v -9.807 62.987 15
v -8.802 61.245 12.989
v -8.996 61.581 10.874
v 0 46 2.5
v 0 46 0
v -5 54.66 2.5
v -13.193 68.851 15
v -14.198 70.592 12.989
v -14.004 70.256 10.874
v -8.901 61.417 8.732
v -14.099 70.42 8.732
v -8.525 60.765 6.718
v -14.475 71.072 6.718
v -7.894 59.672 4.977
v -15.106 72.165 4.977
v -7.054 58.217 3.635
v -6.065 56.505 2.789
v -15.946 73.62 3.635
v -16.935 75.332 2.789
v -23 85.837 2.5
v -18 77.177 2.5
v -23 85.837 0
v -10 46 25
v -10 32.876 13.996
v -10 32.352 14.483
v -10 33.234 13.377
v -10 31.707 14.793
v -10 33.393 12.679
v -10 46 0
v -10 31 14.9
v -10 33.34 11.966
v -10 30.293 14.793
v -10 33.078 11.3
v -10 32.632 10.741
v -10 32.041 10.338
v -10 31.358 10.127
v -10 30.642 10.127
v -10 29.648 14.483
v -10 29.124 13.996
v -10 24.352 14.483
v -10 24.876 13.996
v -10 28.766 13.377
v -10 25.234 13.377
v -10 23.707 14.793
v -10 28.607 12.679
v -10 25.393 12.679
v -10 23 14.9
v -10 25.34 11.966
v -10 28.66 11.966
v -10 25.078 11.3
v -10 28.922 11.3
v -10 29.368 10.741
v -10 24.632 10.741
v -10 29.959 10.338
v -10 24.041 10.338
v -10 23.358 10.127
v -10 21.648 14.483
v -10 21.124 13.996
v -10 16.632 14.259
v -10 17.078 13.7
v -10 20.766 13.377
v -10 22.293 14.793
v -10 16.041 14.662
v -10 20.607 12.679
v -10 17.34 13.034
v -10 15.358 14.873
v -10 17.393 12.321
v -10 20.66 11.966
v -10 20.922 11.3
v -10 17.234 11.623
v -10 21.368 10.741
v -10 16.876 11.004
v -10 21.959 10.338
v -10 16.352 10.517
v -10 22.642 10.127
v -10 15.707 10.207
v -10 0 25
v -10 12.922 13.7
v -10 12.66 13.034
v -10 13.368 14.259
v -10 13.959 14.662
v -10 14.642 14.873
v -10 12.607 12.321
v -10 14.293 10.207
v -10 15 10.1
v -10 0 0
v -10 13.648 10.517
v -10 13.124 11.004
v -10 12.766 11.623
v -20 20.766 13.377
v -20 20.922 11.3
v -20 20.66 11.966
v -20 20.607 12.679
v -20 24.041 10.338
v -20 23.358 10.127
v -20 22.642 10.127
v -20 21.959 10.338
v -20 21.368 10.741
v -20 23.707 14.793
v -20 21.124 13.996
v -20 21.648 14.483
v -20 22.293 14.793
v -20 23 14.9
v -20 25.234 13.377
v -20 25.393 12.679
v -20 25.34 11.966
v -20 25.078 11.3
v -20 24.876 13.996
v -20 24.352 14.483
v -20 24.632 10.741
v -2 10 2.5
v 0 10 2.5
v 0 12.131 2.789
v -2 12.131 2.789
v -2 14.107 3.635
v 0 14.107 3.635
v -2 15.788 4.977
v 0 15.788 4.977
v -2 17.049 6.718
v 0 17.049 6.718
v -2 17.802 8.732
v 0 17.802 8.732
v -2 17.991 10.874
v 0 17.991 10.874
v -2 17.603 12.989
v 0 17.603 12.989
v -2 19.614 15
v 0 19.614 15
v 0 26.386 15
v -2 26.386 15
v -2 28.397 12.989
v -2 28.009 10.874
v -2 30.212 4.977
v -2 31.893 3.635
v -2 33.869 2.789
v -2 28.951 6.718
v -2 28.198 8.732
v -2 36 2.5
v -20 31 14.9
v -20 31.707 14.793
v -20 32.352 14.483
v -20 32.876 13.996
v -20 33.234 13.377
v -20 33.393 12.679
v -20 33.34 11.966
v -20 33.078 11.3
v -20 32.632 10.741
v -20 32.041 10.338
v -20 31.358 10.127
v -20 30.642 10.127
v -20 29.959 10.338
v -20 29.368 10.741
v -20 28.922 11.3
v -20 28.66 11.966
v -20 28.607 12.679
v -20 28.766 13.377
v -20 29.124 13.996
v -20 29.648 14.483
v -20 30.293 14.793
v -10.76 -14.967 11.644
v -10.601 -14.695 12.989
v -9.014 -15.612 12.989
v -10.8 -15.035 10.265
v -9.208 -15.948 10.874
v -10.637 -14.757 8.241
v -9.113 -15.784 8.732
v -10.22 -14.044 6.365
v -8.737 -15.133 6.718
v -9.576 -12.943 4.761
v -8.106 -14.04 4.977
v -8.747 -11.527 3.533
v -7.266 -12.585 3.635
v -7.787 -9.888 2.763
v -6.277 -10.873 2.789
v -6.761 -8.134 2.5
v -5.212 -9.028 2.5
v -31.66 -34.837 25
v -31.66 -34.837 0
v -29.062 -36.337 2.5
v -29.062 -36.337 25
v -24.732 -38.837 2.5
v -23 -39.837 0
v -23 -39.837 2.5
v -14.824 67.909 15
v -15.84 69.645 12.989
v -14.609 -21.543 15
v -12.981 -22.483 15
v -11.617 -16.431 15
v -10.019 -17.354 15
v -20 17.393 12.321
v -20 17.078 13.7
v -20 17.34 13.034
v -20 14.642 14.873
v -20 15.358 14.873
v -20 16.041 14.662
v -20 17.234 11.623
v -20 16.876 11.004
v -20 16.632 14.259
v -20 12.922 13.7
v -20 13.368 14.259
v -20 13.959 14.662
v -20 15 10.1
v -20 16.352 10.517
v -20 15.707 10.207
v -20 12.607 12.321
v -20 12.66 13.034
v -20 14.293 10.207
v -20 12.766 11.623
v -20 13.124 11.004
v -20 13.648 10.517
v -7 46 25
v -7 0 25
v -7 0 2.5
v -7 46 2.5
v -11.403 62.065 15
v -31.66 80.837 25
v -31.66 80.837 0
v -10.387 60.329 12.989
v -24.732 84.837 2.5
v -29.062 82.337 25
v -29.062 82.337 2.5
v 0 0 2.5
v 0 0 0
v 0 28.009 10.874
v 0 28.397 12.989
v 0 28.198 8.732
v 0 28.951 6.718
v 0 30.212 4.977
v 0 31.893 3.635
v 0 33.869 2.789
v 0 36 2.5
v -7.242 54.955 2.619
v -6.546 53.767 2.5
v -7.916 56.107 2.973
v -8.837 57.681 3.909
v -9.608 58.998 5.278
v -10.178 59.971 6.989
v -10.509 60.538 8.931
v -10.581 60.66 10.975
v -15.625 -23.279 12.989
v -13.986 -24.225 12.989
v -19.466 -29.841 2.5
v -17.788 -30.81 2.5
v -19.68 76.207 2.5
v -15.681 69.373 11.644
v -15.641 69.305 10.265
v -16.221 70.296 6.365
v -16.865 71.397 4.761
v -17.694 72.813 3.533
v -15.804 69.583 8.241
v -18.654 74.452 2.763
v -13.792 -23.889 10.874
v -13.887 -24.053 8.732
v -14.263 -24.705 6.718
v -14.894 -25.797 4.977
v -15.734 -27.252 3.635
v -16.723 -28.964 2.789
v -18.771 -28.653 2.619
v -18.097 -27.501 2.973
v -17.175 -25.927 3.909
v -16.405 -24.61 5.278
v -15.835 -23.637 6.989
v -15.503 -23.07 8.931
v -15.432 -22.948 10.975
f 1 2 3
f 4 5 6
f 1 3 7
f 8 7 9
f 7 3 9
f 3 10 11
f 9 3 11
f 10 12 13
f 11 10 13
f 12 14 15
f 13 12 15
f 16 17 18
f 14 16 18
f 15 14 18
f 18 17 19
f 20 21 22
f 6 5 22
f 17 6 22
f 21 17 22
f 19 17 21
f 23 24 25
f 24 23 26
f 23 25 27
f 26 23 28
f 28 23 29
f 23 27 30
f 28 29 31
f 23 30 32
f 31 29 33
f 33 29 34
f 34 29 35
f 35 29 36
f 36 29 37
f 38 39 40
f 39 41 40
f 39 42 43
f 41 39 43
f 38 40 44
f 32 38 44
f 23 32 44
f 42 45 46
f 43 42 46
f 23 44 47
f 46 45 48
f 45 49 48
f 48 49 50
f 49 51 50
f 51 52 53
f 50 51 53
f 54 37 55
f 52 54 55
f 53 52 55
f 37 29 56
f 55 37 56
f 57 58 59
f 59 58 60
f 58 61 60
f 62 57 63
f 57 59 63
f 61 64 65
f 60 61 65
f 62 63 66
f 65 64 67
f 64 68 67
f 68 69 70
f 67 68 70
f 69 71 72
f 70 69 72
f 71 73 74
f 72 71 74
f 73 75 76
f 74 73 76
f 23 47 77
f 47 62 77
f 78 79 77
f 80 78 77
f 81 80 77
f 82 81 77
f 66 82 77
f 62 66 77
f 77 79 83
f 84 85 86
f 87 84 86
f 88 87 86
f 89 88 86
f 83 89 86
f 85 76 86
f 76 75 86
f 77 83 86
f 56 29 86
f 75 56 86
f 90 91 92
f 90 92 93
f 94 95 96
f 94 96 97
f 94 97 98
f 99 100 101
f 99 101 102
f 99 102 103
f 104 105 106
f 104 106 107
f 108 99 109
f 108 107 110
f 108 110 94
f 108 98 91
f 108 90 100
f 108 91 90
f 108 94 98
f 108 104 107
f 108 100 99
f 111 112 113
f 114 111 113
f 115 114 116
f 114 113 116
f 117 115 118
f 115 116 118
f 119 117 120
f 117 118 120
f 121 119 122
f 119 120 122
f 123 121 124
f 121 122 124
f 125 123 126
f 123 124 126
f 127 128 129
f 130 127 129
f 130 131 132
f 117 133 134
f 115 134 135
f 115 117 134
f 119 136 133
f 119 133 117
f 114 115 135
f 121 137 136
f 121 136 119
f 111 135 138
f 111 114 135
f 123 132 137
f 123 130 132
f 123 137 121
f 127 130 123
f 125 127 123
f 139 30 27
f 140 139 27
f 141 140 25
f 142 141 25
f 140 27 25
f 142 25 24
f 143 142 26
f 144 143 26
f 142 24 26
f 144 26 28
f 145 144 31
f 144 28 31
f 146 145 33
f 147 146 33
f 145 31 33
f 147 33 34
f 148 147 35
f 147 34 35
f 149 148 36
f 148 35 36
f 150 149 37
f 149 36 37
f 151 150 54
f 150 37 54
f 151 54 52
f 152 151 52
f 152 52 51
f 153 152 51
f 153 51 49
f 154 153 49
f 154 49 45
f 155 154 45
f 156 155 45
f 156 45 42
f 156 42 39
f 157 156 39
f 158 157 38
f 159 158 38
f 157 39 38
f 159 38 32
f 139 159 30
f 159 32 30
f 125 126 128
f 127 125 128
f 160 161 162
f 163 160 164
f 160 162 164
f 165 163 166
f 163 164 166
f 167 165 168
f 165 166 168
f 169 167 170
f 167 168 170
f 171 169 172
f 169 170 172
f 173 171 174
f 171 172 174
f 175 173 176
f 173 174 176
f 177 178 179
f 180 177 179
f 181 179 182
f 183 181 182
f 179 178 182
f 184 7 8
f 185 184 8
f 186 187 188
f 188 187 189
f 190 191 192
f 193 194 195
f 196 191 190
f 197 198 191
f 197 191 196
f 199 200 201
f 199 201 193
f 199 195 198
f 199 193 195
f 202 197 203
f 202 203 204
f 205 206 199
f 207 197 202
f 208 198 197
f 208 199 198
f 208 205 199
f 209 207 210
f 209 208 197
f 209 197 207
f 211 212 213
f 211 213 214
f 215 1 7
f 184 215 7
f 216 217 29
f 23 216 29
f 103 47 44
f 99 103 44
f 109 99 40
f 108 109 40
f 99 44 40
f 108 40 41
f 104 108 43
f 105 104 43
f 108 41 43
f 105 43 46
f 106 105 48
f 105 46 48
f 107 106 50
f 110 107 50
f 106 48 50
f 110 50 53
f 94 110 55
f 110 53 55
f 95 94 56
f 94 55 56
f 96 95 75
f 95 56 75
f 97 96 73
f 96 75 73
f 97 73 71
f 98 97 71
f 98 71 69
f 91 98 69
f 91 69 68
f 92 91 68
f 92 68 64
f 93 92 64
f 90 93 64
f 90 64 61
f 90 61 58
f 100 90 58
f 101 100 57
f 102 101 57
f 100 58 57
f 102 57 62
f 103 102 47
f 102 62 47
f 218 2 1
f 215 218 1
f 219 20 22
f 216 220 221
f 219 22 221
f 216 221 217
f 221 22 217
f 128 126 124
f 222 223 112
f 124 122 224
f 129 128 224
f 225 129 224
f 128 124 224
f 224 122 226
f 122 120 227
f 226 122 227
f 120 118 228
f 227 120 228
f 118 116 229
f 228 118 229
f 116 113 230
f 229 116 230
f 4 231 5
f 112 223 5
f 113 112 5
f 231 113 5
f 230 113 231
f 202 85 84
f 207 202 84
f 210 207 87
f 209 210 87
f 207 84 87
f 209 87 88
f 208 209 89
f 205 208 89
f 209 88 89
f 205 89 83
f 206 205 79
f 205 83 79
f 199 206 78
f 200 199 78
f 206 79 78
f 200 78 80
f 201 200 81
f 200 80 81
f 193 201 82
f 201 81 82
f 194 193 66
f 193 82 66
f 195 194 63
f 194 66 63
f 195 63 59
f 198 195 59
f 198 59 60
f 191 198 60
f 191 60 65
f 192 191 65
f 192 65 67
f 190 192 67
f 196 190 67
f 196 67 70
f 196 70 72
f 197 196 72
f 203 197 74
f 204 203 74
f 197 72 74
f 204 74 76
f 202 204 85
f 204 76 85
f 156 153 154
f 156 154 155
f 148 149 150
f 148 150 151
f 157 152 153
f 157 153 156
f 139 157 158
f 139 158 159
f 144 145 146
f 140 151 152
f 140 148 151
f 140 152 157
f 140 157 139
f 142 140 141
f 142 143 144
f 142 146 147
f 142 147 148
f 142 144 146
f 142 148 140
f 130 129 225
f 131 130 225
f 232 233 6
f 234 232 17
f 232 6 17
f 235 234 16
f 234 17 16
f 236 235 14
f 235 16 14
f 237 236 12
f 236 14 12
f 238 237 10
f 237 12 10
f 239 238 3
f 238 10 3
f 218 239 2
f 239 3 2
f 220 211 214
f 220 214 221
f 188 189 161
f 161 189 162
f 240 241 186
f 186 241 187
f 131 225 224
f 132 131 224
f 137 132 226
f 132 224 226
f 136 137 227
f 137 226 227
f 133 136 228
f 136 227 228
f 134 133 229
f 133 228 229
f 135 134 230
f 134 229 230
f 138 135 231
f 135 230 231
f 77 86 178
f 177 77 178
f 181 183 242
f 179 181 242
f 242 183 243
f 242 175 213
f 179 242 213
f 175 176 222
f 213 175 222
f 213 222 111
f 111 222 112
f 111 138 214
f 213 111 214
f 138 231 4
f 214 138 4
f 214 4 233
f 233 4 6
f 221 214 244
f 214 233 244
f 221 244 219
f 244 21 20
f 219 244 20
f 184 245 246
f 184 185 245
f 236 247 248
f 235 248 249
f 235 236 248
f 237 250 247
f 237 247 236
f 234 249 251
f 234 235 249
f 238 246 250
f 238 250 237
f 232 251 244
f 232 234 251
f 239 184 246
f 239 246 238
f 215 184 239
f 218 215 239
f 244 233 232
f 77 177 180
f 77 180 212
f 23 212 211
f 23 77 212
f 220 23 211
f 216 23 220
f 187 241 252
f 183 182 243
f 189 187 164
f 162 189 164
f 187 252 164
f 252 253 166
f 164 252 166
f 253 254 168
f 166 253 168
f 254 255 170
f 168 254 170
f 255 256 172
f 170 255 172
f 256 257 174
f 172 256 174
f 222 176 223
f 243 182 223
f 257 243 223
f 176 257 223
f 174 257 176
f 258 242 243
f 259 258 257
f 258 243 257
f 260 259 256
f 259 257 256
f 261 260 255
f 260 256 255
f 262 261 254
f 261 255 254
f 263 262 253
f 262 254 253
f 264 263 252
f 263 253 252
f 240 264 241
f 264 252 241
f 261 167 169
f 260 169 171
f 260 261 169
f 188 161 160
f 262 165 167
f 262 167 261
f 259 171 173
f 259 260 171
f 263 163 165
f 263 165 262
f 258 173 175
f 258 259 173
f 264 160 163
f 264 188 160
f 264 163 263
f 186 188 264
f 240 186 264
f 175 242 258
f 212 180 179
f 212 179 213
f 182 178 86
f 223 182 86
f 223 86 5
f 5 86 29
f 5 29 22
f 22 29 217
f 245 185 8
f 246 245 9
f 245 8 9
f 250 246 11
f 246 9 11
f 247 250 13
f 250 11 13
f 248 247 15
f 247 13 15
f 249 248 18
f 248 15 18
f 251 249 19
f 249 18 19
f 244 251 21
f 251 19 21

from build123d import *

# Parameters (mm, degrees)
BOSS_EXTRUDE2_DEPTH = 25
CUT_EXTRUDE4_DEPTH  = 22.5
CUT_EXTRUDE5_DEPTH  = 2
CUT_EXTRUDE6_DEPTH  = 2
CUT_EXTRUDE7_DEPTH  = 2
SKETCH9_R           = 2.4
BOSS_EXTRUDE3_DEPTH = 10


with BuildPart() as part:
    # Sketch1 → Boss-Extrude2 (new body)
    with BuildSketch(Plane(origin=(0, 0, 0), x_dir=(0, 1, 0), z_dir=(0, 0, 1))):
        Polygon((0, 0), (46, 0), (85.837168574, 23), (80.837168574, 31.660254038), (46, 10), (0, 10), (-34.837168574, 31.660254038), (-39.837168574, 23), align=None)
    extrude(amount=BOSS_EXTRUDE2_DEPTH)

    # Sketch5 → Cut-Extrude4 (cut)
    with BuildSketch(Plane.XY.offset(25)):
        Polygon((-24.732050808, -38.837168574), (-29.062177826, -36.337168574), (-7, 0), (-7, 46), (-29.062177826, 82.337168574), (-24.732050808, 84.837168574), (-2, 46), (-2, 0), align=None)
    extrude(amount=-CUT_EXTRUDE4_DEPTH, mode=Mode.SUBTRACT)

    # Sketch6 → Cut-Extrude5 (cut)
    with BuildSketch(Plane.YZ):
        with BuildLine():
            Line((0, 2.5), (10, 2.5))
            ThreePointArc((10, 2.5), (16.477245972, 5.804759365), (17.603057122, 12.988678845))
            Line((17.603057122, 12.988678845), (19.614378278, 15))
            Line((19.614378278, 15), (26.385621722, 15))
            Line((26.385621722, 15), (28.396942878, 12.988678845))
            ThreePointArc((28.396942878, 12.988678845), (29.522754028, 5.804759365), (36, 2.5))
            Line((36, 2.5), (46, 2.5))
            Line((46, 2.5), (46, 25))
            Line((46, 25), (0, 25))
            Line((0, 25), (0, 2.5))
        make_face()
    extrude(amount=-CUT_EXTRUDE5_DEPTH, mode=Mode.SUBTRACT)

    # Sketch7 → Cut-Extrude6 (cut)
    with BuildSketch(Plane(origin=(19.918584287, 11.5, 0), x_dir=(-0.5000000000000007, 0.8660254037844383, 0), z_dir=(0.8660254037844383, 0.5000000000000007, 0))):
        with BuildLine():
            Line((39.837168574, 25), (39.837168574, 2.5))
            Line((39.837168574, 2.5), (49.837168574, 2.5))
            ThreePointArc((49.837168574, 2.5), (56.314414546, 5.804759365), (57.440225697, 12.988678845))
            Line((57.440225697, 12.988678845), (59.451546852, 15))
            Line((59.451546852, 15), (62.837168574, 15))
            Line((62.837168574, 15), (66.222790296, 15))
            Line((66.222790296, 15), (68.234111452, 12.988678845))
            ThreePointArc((68.234111452, 12.988678845), (69.359922602, 5.804759365), (75.837168574, 2.5))
            Line((75.837168574, 2.5), (85.837168574, 2.5))
            Line((85.837168574, 2.5), (85.837168574, 25))
            Line((85.837168574, 25), (39.837168574, 25))
        make_face()
    extrude(amount=-CUT_EXTRUDE6_DEPTH, mode=Mode.SUBTRACT)

    # Sketch8 → Cut-Extrude7 (cut)
    with BuildSketch(Plane(origin=(0, 0, 0), x_dir=(0.5000000000000014, 0.8660254037844378, 0), z_dir=(0.8660254037844378, -0.5000000000000014, 0))):
        with BuildLine():
            Line((-10.424182503, 2.5), (0, 2.5))
            Line((0, 2.5), (0, 25))
            Line((0, 25), (-46, 25))
            Line((-46, 25), (-46, 2.5))
            Line((-46, 2.5), (-35.575817497, 2.5))
            ThreePointArc((-35.575817497, 2.5), (-29.098571525, 5.804759365), (-27.972760375, 12.988678845))
            Line((-27.972760375, 12.988678845), (-25.961439219, 15))
            Line((-25.961439219, 15), (-23, 15))
            Line((-23, 15), (-20.038560781, 15))
            Line((-20.038560781, 15), (-18.027239625, 12.988678845))
            ThreePointArc((-18.027239625, 12.988678845), (-16.901428475, 5.804759365), (-10.424182503, 2.5))
        make_face()
    extrude(amount=-CUT_EXTRUDE7_DEPTH, mode=Mode.SUBTRACT)

    # Sketch9 → Boss-Extrude3 (add)
    with BuildSketch(Plane(origin=(-10, 0, 0), x_dir=(0, -1, 0), z_dir=(-1, 0, 0))):
        with Locations(Location((-23, 12.5, 0), (0, 0, 90))):
            Circle(SKETCH9_R)
        with Locations(Location((-31, 12.5, 0), (0, 0, 90))):
            Circle(SKETCH9_R)
        with Locations(Location((-15, 12.5, 0), (0, 0, 270))):
            Circle(SKETCH9_R)
    extrude(amount=BOSS_EXTRUDE3_DEPTH)


solid = part.part
